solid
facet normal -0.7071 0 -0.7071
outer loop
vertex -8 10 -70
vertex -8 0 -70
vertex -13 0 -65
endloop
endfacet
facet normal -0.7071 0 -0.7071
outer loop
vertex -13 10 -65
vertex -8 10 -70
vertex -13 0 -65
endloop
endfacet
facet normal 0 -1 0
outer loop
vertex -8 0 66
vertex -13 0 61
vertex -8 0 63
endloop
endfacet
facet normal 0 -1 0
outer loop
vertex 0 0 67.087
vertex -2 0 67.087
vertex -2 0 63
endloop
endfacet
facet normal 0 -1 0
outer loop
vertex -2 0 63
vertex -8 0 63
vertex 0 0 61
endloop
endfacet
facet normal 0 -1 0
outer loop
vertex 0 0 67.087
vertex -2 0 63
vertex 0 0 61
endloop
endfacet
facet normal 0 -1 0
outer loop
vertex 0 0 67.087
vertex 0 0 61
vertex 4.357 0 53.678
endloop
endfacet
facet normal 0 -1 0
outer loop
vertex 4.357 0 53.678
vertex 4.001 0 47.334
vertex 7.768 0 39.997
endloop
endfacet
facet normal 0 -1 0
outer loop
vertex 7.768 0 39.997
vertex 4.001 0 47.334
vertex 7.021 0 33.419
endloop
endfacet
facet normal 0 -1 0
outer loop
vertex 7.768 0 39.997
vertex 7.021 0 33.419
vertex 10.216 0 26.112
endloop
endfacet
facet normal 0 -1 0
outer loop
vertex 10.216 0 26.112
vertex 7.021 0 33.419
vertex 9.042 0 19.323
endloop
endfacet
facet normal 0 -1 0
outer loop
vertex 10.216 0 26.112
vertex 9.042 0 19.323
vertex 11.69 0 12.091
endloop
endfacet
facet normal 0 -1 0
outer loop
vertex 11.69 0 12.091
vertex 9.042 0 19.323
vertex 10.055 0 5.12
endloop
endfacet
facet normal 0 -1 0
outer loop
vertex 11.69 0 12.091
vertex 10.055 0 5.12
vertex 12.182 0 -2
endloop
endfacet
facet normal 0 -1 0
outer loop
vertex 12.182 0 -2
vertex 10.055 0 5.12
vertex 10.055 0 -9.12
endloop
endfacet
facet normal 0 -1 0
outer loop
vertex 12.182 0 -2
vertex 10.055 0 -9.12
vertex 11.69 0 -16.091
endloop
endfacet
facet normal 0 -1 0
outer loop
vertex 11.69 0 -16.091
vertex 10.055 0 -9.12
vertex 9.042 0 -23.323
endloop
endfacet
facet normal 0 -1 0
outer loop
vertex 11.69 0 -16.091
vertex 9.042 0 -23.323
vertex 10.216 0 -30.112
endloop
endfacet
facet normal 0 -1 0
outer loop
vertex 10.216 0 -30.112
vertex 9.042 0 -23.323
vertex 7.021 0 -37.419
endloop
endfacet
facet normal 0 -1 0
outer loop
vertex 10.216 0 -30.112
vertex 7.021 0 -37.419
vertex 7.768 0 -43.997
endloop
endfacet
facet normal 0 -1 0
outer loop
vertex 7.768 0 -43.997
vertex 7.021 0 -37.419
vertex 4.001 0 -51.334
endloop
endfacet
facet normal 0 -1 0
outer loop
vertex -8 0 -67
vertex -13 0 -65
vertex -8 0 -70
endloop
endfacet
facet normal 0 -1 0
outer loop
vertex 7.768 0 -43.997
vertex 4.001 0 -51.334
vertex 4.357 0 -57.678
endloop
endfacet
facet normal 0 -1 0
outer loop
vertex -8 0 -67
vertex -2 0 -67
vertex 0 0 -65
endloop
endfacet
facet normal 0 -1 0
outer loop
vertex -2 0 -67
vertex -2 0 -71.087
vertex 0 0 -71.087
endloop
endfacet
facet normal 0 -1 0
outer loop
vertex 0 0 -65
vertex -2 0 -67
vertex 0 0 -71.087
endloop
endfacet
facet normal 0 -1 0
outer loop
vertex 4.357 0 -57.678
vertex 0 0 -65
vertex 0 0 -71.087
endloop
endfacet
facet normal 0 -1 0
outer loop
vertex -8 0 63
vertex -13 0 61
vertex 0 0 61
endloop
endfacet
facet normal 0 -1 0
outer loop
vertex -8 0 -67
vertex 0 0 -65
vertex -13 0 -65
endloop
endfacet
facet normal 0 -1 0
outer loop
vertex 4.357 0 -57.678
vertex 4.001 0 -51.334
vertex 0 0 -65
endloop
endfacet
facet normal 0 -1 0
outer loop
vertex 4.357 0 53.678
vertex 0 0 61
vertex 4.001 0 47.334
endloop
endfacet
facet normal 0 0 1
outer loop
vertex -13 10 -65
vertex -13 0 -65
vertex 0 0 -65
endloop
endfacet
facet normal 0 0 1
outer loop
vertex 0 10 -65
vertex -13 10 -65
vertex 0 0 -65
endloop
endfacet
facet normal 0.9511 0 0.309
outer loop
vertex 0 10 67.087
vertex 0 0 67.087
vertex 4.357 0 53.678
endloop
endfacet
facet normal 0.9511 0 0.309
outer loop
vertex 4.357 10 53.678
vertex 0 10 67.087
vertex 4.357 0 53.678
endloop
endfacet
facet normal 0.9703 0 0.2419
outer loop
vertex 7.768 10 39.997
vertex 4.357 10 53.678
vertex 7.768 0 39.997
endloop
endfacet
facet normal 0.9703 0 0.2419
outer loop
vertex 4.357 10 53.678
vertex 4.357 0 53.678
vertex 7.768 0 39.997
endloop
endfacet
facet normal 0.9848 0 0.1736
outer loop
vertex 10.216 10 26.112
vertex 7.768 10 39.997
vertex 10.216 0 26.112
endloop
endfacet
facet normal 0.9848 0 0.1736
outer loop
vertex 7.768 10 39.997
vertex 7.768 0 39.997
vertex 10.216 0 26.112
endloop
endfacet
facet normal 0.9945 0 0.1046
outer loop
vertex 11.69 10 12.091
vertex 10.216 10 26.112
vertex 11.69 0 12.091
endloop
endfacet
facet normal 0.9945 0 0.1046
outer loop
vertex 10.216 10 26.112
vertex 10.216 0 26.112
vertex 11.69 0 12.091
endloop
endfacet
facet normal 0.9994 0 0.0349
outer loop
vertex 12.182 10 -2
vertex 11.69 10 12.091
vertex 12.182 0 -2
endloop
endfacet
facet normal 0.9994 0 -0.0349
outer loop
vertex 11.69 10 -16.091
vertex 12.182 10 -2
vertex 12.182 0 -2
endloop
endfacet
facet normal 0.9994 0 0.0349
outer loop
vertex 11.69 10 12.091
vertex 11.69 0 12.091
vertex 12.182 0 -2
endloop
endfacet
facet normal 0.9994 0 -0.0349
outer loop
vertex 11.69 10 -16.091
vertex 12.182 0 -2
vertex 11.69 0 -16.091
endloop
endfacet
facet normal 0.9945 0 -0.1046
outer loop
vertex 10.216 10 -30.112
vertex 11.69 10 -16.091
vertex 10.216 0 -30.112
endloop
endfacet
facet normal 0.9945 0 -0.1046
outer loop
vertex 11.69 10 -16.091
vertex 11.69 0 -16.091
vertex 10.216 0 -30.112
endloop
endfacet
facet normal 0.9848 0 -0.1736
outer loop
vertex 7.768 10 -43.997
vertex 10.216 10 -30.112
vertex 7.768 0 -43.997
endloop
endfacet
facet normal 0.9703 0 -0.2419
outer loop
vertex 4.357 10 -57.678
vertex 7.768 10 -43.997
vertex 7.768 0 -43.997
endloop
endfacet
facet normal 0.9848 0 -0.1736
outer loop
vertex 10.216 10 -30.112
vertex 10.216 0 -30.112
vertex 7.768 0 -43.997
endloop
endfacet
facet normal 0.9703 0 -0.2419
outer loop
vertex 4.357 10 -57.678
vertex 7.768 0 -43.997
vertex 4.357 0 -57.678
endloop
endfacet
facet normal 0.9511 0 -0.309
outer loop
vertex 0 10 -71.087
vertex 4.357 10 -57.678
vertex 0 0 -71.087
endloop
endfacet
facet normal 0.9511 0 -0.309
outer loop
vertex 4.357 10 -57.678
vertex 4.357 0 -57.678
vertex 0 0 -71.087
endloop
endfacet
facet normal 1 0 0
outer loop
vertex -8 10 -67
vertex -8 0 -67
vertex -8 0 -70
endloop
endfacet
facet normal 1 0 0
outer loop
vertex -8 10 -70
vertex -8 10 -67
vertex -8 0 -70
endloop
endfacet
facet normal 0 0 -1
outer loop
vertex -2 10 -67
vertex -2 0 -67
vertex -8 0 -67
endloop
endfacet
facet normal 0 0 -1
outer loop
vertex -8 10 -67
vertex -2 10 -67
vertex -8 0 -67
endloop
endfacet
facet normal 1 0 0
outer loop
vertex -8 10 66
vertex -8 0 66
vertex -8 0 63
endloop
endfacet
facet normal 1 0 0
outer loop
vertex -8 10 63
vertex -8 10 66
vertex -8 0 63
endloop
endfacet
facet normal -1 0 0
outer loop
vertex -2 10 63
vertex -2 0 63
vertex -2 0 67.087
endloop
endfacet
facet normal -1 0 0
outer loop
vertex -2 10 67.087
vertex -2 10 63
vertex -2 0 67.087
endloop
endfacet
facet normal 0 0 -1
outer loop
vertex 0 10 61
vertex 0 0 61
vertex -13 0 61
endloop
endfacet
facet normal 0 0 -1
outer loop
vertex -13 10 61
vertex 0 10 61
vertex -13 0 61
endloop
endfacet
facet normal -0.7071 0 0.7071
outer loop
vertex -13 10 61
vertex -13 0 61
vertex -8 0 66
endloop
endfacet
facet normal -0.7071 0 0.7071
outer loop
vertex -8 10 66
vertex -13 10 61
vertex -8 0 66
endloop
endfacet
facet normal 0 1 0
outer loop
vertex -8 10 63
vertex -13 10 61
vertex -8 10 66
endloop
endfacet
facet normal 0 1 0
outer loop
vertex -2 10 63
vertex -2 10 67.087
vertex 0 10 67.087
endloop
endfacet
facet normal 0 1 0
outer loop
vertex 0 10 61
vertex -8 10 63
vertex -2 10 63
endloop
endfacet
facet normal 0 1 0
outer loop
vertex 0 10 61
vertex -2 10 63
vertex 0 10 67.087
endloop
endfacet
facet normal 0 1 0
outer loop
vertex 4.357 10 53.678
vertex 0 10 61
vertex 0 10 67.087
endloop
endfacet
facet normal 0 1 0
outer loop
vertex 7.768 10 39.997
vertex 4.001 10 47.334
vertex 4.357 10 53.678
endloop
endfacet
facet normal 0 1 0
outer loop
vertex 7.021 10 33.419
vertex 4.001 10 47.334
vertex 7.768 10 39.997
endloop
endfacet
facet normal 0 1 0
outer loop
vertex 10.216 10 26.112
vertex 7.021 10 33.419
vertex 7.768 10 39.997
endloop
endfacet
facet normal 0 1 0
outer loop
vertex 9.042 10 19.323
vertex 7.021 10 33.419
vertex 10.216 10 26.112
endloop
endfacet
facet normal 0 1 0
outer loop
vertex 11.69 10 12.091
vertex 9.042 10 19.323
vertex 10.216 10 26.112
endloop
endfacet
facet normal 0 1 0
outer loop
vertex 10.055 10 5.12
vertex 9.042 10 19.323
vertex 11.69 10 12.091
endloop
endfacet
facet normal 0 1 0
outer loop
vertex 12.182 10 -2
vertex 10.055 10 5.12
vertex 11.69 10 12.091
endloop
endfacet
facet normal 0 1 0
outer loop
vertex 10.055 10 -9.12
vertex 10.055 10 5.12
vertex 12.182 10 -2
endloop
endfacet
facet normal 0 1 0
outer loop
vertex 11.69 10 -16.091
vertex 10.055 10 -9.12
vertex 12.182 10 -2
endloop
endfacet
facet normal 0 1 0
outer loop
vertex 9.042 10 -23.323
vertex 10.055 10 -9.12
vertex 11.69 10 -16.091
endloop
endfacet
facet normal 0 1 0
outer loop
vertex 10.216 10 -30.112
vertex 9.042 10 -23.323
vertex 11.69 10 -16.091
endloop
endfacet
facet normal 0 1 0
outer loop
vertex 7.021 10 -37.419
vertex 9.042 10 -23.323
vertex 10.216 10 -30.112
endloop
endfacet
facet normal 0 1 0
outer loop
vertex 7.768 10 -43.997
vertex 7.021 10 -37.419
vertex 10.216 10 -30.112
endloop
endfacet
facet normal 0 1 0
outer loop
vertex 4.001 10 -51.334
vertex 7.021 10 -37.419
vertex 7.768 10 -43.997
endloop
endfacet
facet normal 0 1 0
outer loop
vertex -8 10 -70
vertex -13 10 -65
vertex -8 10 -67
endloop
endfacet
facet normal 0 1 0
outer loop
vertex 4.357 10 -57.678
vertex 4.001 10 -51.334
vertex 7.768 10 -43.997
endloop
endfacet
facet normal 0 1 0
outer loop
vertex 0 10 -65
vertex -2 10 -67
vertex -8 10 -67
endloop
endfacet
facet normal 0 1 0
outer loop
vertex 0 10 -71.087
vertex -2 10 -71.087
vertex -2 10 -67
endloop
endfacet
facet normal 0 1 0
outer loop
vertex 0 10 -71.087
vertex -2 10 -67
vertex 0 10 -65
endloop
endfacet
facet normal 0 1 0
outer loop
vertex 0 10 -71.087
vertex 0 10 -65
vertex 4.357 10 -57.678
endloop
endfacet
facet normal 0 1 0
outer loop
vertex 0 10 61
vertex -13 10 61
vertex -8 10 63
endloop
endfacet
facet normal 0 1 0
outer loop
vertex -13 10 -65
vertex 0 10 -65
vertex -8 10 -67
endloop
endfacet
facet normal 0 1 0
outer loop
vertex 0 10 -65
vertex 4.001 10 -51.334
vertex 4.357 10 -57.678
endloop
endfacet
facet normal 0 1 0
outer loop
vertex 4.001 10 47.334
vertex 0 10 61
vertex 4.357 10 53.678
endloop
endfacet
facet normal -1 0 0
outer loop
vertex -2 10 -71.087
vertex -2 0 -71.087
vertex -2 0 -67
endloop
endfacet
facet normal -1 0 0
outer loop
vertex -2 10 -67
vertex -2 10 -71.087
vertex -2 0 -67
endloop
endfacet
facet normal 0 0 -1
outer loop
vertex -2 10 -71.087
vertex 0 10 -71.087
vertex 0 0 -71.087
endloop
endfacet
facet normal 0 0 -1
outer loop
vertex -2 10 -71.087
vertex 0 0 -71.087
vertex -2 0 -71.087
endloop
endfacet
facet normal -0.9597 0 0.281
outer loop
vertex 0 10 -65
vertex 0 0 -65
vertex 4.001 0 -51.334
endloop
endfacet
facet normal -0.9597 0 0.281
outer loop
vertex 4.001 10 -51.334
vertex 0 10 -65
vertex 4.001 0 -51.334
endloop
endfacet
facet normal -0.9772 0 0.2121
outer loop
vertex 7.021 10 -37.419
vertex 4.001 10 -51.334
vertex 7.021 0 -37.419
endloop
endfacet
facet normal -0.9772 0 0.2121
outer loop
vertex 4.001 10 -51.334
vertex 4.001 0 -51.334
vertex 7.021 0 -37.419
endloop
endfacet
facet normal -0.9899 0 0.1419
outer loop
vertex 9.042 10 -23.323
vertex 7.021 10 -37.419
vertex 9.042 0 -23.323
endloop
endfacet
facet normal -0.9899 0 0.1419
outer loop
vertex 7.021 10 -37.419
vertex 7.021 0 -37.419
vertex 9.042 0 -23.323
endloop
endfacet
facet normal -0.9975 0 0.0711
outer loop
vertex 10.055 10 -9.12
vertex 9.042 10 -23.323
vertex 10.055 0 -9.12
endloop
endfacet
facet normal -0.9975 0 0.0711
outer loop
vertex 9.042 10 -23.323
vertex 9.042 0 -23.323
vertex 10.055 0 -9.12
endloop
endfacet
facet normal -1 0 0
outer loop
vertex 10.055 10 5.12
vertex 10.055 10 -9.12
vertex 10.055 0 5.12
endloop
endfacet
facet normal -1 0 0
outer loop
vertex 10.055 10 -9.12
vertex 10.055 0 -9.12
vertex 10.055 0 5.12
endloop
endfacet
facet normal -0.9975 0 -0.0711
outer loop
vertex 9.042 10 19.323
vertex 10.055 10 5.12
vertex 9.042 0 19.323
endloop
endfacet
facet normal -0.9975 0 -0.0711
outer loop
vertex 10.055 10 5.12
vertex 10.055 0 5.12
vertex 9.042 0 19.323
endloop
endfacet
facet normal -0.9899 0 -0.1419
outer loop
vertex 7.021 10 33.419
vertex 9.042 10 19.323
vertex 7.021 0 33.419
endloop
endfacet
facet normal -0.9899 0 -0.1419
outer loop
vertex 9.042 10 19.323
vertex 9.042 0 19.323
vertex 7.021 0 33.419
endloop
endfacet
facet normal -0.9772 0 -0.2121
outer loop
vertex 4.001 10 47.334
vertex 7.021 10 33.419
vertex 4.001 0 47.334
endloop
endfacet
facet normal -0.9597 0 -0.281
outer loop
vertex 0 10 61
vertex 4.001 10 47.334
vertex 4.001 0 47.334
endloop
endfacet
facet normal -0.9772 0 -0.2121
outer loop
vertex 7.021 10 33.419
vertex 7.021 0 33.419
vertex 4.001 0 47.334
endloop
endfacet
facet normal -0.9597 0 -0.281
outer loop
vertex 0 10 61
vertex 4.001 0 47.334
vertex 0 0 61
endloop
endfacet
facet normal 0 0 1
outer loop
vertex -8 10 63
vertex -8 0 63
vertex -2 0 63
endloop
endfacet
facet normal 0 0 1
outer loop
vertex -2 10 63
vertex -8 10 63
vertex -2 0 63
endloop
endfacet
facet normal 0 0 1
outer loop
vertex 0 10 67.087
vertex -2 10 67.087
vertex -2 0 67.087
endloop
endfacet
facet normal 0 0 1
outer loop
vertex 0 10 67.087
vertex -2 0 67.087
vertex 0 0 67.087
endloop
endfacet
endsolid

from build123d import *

# Parameters (mm, degrees)
BOSS_EXTRU_1_DEPTH = 10


with BuildPart() as part:
    # Esquisse1 → Boss.-Extru.1 (new body)
    with BuildSketch(Plane(origin=(0, 0, 0), x_dir=(1, 0, 0), z_dir=(0, 1, 0))):
        with BuildLine():
            Line((0, -61), (-13, -61))
            Line((-13, -61), (-8, -66))
            Line((-8, -66), (-8, -63))
            Line((-8, -63), (-2, -63))
            Line((-2, -63), (-2, -67.086901798))
            Line((-2, -67.086901798), (0, -67.086901798))
            ThreePointArc((0, -67.086901798), (12.181665796, 2), (0, 71.086901798))
            Line((0, 71.086901798), (-2, 71.086901798))
            Line((-2, 71.086901798), (-2, 67))
            Line((-2, 67), (-8, 67))
            Line((-8, 67), (-8, 70))
            Line((-8, 70), (-13, 65))
            Line((-13, 65), (0, 65))
            ThreePointArc((0, 65), (10.181665796, 2), (0, -61))
        make_face()
    extrude(amount=BOSS_EXTRU_1_DEPTH)


solid = part.part
